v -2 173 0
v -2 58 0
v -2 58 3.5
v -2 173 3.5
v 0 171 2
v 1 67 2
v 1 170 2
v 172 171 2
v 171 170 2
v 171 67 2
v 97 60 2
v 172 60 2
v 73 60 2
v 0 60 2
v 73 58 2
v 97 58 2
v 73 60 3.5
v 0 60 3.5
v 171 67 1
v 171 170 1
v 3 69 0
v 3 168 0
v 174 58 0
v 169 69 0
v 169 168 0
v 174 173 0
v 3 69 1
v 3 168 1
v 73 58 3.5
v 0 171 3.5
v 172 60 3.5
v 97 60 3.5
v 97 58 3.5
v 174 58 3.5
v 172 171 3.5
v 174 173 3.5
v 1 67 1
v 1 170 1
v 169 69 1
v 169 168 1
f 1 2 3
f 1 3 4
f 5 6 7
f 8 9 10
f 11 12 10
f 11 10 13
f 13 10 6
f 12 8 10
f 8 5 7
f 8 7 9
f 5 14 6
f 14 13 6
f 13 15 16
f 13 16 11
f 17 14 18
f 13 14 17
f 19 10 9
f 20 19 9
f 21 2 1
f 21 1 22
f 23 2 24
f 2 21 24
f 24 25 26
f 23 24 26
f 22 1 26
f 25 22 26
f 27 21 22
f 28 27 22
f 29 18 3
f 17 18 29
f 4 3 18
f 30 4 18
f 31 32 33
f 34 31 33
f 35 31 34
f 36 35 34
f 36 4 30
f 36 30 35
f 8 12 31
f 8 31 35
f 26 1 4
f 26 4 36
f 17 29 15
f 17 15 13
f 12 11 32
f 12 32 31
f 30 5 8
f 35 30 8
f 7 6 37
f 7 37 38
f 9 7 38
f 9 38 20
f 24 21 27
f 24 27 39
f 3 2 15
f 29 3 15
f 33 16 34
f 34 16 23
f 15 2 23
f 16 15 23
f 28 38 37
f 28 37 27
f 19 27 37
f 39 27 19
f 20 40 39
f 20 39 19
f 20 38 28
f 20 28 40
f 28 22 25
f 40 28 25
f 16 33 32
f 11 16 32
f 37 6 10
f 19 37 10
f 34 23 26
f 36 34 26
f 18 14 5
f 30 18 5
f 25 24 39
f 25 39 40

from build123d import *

# Parameters (mm, degrees)
SKETCH025_W     = 176
SKETCH025_H     = 115
SKETCH025_W_2   = 166
SKETCH025_H_2   = 99
PAD009_DEPTH    = 2
SKETCH026_W     = 170
SKETCH026_H     = 103
POCKET012_DEPTH = 1
SKETCH027_W     = 176
SKETCH027_H     = 115
SKETCH027_W_2   = 172
SKETCH027_H_2   = 111
PAD010_DEPTH    = 3.5
SKETCH028_W     = 24
SKETCH028_H     = 15
POCKET013_DEPTH = 1.5


with BuildPart() as part:
    # Sketch025 → Pad009 (new body)
    with BuildSketch(Plane.XY):
        with Locations((86, 115.5)):
            Rectangle(SKETCH025_W, SKETCH025_H)
        with Locations((86, 118.5)):
            Rectangle(SKETCH025_W_2, SKETCH025_H_2, mode=Mode.SUBTRACT)
    extrude(amount=PAD009_DEPTH)

    # Sketch026 → Pocket012 (cut)
    with BuildSketch(Plane.XY.offset(2)):
        with Locations((86, 118.5)):
            Rectangle(SKETCH026_W, SKETCH026_H)
    extrude(amount=-POCKET012_DEPTH, mode=Mode.SUBTRACT)

    # Sketch027 → Pad010 (join)
    with BuildSketch(Plane.XY):
        with Locations((86, 115.5)):
            Rectangle(SKETCH027_W, SKETCH027_H)
        with Locations((86, 115.5)):
            Rectangle(SKETCH027_W_2, SKETCH027_H_2, mode=Mode.SUBTRACT)
    extrude(amount=PAD010_DEPTH)

    # Sketch028 → Pocket013 (cut)
    with BuildSketch(Plane.XY.offset(3.5)):
        with Locations((85, 53.5)):
            Rectangle(SKETCH028_W, SKETCH028_H)
    extrude(amount=-POCKET013_DEPTH, mode=Mode.SUBTRACT)


solid = part.part
